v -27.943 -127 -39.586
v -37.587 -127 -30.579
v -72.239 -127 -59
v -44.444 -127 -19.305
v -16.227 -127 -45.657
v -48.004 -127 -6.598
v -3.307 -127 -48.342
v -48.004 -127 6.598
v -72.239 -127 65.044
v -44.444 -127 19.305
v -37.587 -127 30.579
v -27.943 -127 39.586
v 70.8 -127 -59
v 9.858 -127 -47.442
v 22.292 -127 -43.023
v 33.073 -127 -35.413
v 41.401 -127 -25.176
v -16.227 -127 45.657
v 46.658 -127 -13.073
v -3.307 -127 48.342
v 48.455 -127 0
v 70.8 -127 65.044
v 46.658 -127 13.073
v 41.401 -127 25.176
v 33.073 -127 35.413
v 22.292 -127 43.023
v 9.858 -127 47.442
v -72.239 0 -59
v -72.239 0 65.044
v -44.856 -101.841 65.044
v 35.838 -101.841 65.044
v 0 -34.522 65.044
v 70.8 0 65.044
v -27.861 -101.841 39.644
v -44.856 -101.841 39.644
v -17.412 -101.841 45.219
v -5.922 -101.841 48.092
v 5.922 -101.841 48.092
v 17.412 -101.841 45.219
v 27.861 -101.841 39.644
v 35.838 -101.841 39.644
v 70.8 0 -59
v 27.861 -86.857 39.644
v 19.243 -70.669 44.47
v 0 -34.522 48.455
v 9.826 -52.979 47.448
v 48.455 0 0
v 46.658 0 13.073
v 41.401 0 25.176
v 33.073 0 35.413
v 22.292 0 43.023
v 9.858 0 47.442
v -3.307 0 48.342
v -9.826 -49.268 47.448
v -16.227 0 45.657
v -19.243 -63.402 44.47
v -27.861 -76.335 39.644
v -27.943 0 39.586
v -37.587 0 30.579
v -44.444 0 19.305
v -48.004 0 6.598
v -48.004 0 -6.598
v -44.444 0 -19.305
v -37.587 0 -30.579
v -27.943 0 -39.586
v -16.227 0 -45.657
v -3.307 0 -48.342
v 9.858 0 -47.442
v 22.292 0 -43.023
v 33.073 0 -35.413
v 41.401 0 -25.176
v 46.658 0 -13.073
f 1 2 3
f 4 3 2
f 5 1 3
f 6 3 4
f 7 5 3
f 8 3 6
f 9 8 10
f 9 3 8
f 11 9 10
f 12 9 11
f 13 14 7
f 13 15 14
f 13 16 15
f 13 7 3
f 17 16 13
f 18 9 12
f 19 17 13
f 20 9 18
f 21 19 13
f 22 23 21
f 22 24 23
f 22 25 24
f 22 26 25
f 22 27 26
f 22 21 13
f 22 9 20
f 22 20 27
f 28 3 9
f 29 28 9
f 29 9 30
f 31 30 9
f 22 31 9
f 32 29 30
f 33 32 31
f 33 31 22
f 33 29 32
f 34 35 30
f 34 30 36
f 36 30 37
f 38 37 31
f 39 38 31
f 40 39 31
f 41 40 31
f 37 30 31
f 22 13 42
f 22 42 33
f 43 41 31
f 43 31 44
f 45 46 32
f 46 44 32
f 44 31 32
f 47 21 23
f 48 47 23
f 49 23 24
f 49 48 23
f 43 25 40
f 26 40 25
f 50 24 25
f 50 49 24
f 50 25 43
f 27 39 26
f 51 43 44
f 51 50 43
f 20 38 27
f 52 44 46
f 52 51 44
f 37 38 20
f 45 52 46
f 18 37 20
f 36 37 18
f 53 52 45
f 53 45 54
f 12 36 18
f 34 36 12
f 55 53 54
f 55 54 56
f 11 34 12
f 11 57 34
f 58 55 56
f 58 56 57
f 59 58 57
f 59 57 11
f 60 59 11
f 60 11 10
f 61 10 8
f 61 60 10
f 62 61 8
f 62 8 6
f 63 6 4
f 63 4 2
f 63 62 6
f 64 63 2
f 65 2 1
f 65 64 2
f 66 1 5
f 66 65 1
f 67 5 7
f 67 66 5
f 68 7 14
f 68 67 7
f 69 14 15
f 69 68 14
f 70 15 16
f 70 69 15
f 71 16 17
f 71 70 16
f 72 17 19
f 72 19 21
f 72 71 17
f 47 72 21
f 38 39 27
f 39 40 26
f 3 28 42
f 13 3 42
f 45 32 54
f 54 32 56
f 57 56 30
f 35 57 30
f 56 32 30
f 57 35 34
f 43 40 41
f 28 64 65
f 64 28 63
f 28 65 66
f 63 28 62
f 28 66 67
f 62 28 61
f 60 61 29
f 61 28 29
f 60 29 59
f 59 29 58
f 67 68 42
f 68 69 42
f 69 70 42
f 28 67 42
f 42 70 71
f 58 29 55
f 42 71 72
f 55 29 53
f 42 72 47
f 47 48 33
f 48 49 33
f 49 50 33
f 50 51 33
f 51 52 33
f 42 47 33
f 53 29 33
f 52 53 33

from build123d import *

# Parameters (mm, degrees)
F0_W     = 143.039465
F0_H     = 124.044284
F0_R     = 48.455105
F1_DEPTH = 127
F3_DEPTH = 25.4


with BuildPart() as f1:
    # F0 (on Front) → F1 (new body)
    with BuildSketch(Plane.XZ):
        with Locations((-0.719518, 3.021963)):
            Rectangle(F0_W, F0_H)
        Circle(F0_R, mode=Mode.SUBTRACT)
    extrude(amount=F1_DEPTH)

    # F2 (on face) → F3 (cut)
    with BuildSketch(Plane.XY.offset(65.044105)):
        Polygon((35.837892, -101.840705), (0, -34.521569), (-44.855904, -101.840705), align=None)
    extrude(amount=-F3_DEPTH, mode=Mode.SUBTRACT)


solid = f1.part
